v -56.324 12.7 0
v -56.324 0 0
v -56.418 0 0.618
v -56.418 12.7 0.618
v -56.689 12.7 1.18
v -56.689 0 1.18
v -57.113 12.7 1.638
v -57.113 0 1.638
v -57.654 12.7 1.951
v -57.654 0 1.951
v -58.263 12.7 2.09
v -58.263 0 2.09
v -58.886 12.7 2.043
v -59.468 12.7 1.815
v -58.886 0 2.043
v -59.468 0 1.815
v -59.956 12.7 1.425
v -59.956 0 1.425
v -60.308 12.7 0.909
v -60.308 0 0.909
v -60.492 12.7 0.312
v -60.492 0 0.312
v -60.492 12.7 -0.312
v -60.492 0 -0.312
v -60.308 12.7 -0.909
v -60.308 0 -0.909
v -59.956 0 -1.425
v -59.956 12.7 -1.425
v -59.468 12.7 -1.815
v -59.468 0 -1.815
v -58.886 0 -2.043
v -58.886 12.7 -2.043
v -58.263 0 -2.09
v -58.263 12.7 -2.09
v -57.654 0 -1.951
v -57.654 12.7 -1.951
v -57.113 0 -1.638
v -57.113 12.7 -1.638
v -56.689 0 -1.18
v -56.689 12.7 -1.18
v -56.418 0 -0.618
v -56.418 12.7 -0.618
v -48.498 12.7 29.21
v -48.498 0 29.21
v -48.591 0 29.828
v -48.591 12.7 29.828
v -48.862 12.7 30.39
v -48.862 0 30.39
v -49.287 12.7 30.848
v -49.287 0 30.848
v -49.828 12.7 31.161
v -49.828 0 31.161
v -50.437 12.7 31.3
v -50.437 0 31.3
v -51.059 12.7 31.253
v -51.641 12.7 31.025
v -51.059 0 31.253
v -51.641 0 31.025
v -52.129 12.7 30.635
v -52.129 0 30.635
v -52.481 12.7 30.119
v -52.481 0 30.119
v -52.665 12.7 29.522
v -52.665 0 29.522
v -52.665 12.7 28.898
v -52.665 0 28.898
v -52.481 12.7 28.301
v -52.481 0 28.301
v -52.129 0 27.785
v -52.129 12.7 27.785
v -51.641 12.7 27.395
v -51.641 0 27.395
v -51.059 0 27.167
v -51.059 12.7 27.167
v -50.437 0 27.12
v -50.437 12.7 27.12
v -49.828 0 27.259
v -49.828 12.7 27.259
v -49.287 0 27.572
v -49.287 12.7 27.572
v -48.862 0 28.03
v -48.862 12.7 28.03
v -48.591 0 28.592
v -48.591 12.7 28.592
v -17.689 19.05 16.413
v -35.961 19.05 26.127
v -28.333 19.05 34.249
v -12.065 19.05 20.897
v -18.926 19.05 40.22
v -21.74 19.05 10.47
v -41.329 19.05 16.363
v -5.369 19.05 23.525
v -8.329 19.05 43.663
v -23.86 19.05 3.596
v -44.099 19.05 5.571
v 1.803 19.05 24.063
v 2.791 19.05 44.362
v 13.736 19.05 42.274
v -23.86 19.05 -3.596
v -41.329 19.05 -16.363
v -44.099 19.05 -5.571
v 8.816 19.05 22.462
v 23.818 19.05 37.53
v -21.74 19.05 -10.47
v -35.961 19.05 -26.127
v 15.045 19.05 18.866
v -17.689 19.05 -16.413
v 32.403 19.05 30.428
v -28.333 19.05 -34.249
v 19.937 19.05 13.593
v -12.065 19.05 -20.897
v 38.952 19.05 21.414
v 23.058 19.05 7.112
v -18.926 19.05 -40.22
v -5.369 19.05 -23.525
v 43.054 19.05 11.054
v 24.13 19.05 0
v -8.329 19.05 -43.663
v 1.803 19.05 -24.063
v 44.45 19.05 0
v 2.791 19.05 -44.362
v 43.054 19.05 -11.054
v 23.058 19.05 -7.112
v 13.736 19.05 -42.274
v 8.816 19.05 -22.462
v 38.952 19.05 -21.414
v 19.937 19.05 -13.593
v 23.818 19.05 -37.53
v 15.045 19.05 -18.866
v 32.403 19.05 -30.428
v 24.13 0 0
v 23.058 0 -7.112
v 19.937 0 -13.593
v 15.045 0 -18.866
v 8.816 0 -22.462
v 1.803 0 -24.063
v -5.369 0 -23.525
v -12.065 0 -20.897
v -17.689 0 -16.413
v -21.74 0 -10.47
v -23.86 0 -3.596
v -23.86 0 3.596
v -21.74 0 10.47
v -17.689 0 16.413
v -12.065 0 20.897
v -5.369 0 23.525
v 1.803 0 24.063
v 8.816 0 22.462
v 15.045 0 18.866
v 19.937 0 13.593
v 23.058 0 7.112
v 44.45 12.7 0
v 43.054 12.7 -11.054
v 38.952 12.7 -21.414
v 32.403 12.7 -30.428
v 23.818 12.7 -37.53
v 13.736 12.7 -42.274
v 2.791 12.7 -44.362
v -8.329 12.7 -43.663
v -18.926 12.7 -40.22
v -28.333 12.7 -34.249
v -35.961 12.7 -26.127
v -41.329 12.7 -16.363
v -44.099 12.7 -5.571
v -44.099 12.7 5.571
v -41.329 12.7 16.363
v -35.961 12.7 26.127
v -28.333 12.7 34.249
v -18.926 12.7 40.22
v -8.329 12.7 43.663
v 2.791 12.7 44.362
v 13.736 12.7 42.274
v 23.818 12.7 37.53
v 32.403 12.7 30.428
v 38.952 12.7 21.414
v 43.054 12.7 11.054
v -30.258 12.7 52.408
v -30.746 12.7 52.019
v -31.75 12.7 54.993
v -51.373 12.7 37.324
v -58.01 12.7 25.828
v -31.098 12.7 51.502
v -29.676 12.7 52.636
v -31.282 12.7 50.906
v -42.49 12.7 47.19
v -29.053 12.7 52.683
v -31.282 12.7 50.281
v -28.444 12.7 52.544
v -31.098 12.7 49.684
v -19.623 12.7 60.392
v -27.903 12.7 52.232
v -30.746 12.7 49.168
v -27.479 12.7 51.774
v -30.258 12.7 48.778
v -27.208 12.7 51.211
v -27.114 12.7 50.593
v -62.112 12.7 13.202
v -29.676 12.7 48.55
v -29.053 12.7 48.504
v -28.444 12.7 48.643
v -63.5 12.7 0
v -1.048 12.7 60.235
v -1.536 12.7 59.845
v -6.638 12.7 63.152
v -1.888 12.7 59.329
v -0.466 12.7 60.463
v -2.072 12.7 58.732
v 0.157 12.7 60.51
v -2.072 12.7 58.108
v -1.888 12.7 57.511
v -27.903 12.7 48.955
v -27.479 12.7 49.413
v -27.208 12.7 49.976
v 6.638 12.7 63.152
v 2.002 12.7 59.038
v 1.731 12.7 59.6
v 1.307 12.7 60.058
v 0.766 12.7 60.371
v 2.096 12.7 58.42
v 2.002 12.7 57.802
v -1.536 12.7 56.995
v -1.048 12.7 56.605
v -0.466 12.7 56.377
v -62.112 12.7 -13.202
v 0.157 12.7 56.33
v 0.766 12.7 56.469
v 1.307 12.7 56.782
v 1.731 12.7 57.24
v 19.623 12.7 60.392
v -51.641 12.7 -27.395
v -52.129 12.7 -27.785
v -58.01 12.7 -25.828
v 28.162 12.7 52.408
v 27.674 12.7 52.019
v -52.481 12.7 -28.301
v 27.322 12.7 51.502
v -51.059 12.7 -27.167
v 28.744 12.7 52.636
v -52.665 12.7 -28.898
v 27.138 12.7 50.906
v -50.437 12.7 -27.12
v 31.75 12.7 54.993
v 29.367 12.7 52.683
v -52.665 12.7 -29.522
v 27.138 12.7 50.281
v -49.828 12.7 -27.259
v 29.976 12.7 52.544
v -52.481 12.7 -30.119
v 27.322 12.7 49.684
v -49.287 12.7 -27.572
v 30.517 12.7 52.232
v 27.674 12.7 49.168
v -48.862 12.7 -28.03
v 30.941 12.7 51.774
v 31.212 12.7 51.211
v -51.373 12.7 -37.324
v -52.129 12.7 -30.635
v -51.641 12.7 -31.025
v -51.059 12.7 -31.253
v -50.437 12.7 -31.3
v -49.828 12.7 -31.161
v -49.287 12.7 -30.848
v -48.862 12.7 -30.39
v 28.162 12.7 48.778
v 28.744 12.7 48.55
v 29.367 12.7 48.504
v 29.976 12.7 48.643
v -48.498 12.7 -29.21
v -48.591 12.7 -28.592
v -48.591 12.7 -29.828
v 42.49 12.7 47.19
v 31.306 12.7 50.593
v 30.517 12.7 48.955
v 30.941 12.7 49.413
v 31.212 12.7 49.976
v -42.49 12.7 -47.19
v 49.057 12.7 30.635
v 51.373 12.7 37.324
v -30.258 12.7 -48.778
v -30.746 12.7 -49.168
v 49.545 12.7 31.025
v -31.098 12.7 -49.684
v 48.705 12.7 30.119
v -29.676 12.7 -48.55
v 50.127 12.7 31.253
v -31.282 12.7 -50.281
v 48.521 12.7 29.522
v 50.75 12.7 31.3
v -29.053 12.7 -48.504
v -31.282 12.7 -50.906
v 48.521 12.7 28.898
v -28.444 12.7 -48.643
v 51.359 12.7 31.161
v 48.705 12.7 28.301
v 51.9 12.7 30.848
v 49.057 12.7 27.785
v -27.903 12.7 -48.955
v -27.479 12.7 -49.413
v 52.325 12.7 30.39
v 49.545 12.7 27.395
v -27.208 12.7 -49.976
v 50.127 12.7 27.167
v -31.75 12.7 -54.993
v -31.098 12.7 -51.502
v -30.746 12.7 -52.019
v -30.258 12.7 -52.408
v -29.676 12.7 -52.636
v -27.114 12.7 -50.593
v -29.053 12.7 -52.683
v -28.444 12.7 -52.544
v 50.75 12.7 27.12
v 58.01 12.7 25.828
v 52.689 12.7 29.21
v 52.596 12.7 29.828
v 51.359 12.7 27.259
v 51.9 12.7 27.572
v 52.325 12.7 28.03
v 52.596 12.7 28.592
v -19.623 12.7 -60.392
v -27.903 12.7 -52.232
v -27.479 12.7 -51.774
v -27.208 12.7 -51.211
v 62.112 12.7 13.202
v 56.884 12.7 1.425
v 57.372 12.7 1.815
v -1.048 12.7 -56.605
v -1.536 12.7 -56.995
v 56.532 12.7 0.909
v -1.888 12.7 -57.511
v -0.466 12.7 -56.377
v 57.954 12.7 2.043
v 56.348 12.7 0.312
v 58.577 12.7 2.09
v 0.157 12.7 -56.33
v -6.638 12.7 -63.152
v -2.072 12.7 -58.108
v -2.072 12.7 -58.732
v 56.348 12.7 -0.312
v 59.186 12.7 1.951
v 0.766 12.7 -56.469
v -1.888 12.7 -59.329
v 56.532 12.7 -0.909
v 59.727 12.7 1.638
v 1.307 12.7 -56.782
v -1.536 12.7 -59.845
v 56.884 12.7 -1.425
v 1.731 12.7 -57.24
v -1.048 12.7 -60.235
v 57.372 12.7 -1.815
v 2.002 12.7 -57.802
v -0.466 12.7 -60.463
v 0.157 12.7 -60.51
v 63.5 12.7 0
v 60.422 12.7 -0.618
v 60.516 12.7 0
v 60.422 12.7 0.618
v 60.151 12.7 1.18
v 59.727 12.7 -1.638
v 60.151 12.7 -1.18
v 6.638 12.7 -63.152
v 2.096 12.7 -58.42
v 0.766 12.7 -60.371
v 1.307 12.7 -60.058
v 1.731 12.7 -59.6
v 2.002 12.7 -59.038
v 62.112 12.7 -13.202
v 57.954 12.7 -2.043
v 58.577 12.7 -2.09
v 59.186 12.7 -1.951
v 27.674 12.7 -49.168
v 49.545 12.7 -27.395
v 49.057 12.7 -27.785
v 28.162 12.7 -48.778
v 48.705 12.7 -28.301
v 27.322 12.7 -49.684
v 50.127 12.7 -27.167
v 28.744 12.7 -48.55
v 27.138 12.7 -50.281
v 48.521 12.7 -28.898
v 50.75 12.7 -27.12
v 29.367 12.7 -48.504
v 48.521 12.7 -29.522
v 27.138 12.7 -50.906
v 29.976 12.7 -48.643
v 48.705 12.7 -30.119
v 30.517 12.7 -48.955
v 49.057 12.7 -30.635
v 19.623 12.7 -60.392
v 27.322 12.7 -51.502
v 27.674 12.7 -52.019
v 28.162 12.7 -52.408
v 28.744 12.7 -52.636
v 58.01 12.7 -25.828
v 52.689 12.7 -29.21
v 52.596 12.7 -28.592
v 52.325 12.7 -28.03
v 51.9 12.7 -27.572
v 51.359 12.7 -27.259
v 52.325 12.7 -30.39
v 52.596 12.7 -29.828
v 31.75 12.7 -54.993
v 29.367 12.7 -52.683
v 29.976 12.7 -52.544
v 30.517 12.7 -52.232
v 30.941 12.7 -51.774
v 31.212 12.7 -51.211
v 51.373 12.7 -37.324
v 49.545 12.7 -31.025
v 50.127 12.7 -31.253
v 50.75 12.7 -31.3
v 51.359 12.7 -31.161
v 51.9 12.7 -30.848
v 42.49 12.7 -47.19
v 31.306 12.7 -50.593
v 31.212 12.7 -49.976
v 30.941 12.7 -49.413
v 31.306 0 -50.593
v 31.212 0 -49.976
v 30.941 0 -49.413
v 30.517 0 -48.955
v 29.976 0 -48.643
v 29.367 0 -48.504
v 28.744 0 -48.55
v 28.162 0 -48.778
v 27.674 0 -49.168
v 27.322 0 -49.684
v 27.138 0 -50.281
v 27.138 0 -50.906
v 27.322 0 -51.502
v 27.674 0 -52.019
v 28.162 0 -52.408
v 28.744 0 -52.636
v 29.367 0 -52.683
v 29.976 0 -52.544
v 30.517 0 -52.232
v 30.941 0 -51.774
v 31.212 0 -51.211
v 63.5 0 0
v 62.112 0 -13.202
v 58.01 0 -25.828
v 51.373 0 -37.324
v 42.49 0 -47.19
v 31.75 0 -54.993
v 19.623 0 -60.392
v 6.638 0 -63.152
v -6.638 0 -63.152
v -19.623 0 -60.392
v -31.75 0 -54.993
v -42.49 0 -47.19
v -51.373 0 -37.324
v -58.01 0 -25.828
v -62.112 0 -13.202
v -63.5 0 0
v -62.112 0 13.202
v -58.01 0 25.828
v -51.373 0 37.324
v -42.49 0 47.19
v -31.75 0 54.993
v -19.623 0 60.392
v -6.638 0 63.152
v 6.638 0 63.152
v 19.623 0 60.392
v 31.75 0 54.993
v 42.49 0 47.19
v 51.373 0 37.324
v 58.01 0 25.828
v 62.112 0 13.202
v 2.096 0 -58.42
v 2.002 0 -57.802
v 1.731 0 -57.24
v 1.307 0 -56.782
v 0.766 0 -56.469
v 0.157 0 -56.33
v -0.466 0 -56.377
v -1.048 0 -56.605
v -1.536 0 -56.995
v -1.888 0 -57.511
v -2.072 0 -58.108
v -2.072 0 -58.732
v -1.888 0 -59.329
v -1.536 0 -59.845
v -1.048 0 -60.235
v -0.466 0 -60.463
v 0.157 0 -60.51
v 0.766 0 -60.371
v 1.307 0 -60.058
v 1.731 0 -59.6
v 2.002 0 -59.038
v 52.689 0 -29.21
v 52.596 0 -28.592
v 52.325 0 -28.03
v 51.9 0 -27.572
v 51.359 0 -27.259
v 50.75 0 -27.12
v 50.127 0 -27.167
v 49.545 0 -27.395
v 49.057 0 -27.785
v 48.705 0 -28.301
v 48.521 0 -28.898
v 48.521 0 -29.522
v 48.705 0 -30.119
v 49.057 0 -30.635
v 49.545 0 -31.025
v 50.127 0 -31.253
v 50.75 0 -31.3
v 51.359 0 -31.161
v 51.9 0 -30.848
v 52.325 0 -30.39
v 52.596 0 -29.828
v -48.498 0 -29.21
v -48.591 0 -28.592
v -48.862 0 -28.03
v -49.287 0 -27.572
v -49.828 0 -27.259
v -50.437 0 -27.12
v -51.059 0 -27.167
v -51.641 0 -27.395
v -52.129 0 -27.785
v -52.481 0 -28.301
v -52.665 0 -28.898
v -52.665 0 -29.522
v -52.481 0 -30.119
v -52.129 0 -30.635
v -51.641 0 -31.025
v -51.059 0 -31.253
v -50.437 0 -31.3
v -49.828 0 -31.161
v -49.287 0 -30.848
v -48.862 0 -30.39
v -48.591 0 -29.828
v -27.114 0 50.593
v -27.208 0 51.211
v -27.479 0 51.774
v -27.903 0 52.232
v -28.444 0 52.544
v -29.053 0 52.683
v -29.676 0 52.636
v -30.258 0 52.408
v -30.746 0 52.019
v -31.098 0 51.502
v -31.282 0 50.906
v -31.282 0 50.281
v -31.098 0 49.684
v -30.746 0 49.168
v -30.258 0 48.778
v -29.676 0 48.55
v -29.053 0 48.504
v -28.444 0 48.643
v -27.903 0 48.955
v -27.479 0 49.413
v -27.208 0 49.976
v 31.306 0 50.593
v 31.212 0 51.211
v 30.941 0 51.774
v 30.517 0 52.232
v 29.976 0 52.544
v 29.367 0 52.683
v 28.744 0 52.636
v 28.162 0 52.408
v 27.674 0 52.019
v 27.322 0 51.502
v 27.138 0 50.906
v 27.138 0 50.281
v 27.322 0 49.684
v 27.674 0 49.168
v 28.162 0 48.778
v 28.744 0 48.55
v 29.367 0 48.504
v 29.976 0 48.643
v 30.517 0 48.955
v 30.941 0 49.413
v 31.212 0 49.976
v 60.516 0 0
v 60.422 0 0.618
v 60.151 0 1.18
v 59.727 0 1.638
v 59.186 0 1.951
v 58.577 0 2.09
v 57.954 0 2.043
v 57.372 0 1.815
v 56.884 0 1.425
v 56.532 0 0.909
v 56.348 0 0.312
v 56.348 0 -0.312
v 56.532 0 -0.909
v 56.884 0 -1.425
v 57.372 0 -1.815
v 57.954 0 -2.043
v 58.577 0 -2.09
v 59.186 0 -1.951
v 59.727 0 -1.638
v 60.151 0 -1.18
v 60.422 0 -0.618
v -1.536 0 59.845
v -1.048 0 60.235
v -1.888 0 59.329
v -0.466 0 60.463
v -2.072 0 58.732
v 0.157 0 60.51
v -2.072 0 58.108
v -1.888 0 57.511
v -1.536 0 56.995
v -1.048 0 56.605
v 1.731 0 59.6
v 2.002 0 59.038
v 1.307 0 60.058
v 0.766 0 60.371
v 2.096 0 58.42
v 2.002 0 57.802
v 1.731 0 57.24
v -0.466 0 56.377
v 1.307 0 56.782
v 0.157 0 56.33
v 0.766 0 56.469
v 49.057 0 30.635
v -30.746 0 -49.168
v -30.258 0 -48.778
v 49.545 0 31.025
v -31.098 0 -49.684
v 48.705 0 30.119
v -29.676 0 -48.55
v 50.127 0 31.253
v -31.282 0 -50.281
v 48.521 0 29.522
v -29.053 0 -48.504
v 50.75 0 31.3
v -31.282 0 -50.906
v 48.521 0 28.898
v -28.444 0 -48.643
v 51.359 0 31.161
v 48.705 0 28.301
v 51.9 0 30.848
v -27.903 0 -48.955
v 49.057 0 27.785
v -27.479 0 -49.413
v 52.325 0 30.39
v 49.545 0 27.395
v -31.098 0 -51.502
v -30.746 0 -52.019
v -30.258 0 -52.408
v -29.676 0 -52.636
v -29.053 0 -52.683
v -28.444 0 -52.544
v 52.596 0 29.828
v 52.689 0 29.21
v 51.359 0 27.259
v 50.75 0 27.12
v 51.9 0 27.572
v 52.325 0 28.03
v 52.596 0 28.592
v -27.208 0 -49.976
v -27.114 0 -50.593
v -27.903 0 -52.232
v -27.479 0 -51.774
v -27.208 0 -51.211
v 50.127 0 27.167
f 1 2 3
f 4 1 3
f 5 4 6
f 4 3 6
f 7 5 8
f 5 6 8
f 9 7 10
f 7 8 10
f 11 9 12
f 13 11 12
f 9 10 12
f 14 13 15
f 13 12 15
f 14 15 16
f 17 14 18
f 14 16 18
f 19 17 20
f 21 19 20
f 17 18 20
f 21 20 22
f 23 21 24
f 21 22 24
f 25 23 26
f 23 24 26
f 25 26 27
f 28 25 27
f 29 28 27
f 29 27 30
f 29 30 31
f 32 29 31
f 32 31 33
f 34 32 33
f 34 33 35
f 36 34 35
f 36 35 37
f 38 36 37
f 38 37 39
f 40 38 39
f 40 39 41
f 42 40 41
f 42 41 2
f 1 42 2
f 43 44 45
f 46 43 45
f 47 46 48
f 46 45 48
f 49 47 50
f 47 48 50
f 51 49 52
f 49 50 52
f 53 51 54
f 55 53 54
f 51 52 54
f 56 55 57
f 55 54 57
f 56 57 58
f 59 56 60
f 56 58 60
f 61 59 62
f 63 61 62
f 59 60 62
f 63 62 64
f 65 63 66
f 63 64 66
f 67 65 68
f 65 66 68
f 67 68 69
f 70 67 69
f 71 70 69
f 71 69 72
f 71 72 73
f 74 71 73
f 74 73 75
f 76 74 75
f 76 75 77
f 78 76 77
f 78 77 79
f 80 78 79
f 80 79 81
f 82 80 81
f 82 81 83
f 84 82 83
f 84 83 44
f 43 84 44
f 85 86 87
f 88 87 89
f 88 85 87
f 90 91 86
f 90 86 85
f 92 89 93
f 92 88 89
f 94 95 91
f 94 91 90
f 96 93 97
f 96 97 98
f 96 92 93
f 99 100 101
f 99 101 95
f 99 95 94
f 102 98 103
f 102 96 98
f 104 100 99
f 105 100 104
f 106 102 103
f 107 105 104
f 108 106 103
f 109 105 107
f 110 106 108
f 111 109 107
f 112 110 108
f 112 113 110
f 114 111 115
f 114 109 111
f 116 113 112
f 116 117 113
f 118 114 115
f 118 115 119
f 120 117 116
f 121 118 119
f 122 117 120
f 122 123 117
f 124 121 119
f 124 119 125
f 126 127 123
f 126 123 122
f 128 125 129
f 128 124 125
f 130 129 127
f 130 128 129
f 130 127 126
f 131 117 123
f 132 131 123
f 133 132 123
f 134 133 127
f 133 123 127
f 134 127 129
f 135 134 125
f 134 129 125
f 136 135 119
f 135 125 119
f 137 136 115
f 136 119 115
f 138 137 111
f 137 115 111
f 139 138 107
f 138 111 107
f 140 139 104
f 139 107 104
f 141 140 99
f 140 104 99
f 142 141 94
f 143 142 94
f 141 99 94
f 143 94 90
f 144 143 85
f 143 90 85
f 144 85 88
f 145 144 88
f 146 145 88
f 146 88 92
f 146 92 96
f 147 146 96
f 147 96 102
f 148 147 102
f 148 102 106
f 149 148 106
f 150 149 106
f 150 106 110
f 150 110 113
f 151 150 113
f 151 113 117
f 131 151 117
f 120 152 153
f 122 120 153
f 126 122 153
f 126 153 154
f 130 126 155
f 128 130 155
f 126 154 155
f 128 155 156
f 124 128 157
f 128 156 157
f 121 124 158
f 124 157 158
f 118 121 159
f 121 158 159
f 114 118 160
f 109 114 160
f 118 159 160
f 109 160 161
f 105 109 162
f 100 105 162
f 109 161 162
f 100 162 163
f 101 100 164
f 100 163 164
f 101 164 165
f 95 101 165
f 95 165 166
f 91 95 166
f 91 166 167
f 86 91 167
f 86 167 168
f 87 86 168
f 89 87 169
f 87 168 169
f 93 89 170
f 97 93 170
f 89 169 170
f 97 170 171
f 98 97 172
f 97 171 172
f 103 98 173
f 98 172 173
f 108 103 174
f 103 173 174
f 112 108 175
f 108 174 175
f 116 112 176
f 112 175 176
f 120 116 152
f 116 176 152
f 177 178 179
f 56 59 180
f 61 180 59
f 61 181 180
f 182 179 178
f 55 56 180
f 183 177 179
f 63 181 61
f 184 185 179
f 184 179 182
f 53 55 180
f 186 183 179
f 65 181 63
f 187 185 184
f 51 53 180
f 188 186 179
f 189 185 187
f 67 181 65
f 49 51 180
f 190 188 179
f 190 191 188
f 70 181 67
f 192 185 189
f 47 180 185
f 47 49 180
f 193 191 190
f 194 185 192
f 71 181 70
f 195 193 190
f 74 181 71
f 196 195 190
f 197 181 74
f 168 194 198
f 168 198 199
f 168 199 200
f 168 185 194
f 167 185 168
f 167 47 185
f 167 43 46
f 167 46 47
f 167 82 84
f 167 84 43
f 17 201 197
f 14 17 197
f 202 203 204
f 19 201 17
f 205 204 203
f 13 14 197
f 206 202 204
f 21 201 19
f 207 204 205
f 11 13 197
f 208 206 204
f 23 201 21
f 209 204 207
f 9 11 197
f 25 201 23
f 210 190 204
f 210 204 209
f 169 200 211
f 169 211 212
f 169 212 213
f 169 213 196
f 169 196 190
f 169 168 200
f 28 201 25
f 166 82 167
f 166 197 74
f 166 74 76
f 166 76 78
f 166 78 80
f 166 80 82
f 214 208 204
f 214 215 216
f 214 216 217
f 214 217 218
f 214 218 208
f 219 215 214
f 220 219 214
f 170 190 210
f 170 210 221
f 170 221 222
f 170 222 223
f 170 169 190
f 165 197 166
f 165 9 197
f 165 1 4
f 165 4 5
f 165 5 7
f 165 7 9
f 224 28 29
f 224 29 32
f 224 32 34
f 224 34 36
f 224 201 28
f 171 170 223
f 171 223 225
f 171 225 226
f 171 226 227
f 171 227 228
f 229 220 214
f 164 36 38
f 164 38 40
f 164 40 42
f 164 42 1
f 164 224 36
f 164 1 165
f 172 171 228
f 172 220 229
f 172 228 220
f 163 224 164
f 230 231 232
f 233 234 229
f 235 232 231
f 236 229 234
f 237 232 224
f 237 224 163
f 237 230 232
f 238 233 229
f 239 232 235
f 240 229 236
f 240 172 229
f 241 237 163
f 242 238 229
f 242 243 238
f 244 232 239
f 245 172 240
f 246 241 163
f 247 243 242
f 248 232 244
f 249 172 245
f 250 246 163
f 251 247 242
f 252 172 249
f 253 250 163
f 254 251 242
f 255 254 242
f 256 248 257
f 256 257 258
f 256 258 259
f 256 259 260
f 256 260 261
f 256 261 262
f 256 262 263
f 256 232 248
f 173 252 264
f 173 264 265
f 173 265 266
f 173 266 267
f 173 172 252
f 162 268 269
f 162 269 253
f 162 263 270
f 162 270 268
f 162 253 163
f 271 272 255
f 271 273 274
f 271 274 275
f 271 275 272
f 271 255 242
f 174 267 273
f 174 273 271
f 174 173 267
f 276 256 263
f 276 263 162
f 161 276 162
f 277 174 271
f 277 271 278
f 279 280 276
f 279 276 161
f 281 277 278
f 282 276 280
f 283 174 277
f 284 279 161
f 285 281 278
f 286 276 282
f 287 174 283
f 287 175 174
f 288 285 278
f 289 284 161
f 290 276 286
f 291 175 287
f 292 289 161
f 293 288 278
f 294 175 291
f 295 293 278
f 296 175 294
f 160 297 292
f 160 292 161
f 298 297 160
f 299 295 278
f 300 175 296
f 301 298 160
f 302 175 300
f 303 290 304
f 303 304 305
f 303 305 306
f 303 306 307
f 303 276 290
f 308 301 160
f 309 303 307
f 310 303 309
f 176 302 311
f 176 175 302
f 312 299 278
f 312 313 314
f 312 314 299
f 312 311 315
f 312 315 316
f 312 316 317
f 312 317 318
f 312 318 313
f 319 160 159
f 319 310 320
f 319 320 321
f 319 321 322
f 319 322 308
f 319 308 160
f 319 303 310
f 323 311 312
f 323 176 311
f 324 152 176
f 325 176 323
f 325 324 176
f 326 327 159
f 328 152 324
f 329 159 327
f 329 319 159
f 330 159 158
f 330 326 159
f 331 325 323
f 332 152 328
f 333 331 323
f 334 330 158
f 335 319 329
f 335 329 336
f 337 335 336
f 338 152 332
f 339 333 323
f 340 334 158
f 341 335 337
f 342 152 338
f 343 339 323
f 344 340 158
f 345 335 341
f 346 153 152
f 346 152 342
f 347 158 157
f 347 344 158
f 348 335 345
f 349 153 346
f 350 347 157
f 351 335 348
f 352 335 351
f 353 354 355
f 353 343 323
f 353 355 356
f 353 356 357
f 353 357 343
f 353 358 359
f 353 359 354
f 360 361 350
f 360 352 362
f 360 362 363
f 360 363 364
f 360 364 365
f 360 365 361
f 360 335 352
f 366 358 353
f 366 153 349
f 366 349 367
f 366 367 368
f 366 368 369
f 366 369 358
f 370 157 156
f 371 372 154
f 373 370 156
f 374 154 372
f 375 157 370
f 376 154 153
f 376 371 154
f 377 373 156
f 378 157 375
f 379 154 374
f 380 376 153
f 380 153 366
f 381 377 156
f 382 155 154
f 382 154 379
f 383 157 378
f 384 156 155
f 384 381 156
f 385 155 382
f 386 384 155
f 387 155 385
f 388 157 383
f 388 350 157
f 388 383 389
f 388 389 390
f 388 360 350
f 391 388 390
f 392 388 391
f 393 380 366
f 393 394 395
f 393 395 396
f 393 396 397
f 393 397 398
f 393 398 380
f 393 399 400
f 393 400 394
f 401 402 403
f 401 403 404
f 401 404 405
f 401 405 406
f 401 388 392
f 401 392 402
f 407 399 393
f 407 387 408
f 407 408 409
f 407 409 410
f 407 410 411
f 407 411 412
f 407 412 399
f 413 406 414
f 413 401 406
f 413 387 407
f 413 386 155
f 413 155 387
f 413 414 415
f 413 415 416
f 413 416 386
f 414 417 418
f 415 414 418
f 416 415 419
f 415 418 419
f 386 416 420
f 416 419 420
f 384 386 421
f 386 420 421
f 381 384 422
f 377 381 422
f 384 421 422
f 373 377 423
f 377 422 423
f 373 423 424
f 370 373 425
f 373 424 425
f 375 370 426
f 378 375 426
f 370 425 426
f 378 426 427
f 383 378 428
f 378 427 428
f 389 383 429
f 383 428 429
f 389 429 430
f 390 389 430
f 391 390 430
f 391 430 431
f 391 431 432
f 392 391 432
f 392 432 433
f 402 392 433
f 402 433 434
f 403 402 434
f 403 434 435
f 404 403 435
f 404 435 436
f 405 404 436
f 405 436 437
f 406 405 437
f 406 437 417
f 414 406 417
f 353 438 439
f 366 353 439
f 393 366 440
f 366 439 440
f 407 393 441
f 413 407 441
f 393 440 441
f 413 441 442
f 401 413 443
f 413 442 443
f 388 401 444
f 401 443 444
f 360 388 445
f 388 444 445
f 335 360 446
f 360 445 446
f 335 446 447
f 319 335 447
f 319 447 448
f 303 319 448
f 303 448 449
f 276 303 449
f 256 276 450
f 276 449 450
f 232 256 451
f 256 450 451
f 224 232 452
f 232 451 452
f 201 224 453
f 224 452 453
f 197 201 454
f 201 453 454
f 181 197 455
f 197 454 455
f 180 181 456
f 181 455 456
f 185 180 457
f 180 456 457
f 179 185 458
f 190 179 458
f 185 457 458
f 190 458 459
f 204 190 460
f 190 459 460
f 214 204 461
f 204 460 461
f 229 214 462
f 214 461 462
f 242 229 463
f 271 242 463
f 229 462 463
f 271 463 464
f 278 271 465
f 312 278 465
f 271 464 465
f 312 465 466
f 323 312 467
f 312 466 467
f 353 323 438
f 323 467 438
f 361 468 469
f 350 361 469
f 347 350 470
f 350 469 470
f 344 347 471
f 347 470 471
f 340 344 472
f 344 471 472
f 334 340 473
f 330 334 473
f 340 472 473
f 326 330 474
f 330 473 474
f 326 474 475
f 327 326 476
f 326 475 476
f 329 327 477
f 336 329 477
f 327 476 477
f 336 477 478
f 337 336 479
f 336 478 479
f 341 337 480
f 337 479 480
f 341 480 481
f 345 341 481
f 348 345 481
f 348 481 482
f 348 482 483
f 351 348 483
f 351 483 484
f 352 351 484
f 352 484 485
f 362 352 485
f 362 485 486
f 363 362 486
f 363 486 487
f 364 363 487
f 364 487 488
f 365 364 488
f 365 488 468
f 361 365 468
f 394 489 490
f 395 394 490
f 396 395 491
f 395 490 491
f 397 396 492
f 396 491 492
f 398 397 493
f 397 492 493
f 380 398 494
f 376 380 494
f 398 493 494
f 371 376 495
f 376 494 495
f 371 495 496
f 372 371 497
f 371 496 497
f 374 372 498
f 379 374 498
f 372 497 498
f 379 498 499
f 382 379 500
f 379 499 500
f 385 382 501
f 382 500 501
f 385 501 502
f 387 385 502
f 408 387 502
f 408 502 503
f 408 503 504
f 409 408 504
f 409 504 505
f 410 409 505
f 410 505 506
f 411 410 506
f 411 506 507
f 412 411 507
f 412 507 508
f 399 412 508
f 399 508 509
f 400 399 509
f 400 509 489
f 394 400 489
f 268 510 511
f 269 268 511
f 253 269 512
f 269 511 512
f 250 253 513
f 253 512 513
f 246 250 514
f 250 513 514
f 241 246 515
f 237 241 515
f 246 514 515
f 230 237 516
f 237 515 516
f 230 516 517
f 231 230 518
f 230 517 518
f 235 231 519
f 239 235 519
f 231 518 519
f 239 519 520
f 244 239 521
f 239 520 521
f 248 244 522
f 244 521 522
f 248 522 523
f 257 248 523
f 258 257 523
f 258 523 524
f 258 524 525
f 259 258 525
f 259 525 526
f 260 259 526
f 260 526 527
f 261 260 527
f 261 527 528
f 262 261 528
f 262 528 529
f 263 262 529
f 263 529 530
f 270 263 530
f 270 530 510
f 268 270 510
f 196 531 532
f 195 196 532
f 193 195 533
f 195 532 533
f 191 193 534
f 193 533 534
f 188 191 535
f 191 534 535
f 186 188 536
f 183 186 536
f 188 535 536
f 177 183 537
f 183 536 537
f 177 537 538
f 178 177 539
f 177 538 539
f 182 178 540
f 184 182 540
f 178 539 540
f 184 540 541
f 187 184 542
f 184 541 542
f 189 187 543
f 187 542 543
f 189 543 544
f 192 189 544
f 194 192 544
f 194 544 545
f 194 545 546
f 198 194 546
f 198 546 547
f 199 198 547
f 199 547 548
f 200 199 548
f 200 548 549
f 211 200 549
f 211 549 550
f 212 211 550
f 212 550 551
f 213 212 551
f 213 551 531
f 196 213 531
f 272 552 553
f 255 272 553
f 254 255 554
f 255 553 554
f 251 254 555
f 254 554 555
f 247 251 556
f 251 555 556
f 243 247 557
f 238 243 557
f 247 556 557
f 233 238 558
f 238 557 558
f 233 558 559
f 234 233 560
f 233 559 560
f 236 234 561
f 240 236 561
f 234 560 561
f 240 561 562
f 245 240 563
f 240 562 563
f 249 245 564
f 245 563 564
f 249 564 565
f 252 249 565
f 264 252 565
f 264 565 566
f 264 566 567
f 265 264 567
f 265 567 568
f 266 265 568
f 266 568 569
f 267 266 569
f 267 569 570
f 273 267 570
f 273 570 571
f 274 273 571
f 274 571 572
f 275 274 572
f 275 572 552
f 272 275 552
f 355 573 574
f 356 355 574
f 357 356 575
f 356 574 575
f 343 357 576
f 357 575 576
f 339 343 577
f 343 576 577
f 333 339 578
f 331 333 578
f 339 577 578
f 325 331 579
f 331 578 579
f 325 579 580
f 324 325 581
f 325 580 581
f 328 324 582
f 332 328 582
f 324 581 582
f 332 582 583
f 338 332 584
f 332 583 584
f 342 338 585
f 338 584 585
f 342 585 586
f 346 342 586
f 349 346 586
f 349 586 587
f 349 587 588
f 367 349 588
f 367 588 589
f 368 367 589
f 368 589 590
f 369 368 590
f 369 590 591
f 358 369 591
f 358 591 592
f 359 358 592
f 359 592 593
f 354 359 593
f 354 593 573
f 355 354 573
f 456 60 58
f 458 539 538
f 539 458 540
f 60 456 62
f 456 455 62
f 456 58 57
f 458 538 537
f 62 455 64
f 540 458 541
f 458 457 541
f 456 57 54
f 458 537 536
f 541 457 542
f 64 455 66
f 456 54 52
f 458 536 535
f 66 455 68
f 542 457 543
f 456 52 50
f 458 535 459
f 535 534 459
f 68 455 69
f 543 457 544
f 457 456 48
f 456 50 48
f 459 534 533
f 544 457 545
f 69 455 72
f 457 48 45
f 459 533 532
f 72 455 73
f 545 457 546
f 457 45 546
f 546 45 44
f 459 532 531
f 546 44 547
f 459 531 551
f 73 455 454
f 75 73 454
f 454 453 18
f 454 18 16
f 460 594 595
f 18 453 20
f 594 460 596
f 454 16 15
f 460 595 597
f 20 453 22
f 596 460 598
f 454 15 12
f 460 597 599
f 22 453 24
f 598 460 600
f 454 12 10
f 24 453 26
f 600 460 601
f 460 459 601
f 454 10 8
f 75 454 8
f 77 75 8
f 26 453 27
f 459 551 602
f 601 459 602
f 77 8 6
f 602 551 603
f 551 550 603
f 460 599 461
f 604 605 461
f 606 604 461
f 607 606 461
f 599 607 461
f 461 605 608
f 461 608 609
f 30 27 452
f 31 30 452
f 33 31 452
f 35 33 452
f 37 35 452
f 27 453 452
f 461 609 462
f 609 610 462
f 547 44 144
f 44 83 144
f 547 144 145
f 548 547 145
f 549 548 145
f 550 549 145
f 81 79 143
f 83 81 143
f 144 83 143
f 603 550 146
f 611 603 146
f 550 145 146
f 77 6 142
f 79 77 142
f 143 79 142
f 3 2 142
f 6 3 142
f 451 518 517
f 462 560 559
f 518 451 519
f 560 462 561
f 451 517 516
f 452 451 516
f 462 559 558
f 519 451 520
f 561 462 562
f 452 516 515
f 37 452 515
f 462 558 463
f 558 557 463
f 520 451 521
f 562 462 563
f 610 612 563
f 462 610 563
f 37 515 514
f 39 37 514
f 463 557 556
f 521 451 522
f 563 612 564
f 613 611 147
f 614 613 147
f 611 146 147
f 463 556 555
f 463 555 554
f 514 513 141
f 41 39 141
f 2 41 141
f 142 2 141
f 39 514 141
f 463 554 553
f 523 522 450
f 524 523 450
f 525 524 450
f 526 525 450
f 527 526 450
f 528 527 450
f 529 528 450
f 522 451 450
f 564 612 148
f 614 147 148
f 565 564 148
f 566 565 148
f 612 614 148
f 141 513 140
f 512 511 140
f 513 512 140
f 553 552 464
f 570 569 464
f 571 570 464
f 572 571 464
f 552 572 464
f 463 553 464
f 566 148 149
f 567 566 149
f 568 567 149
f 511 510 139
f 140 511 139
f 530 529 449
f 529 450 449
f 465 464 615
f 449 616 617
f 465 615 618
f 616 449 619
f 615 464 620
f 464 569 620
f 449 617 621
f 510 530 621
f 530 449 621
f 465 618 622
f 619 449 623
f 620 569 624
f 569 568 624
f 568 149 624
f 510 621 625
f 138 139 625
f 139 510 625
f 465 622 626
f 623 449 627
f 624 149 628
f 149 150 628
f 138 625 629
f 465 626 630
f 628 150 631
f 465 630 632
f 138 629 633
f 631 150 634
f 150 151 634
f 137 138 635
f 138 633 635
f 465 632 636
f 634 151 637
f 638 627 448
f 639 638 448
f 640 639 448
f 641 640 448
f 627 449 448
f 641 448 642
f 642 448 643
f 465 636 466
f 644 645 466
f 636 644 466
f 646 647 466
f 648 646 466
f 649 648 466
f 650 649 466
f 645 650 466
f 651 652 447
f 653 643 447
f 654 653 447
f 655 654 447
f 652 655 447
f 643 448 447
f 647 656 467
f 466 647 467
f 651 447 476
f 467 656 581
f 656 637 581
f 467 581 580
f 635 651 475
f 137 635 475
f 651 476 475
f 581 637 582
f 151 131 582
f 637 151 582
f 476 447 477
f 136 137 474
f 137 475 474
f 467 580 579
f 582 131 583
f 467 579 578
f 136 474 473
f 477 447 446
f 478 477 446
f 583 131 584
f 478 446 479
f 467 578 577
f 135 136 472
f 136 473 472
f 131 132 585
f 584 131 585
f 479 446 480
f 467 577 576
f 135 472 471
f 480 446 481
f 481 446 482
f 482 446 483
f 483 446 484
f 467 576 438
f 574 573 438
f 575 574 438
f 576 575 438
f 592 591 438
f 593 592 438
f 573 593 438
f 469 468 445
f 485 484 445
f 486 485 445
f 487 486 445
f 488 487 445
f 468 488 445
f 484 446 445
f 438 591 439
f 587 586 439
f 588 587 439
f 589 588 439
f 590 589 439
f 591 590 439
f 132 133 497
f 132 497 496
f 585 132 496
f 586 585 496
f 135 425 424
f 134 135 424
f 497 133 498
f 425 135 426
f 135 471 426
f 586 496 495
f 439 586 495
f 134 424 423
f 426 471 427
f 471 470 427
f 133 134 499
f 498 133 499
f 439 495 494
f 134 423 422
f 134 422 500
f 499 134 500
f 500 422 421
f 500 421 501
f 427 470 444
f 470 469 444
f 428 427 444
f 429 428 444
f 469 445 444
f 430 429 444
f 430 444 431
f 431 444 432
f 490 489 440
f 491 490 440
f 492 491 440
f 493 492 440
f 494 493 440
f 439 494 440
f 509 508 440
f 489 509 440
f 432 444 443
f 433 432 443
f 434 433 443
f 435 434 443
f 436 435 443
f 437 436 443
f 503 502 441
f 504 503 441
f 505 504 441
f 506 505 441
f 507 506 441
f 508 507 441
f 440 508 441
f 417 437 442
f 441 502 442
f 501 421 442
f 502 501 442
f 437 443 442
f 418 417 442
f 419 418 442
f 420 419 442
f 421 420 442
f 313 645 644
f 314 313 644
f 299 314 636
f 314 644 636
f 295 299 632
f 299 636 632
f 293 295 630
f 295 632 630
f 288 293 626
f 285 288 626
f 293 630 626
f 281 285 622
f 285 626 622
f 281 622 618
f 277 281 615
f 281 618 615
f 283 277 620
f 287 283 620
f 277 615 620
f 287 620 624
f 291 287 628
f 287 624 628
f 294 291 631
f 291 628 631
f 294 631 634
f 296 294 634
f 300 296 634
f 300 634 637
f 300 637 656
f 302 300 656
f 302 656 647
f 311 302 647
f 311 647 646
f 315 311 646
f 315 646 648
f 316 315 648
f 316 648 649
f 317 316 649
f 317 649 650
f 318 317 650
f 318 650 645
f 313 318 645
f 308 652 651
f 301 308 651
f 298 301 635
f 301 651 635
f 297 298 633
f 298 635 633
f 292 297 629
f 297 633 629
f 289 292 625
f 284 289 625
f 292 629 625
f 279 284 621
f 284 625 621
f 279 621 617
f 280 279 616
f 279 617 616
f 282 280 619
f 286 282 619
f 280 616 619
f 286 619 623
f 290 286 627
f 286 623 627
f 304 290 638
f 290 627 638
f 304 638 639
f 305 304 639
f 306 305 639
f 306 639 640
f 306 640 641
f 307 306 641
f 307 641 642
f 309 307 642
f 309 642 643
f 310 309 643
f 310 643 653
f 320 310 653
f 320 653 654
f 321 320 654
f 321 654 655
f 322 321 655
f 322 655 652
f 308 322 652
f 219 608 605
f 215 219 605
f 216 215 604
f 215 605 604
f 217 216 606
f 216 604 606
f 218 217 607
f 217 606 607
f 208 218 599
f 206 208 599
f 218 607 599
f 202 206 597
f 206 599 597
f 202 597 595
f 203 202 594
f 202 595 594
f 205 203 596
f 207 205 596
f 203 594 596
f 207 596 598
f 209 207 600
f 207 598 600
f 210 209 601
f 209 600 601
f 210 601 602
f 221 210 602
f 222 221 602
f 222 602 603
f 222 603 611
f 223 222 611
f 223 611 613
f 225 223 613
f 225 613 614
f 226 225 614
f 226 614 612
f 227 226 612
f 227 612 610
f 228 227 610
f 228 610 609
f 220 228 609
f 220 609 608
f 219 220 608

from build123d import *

# Parameters (mm, degrees)
SKETCH1_R               = 63.5
BOSS_EXTRUDE1_DEPTH     = 12.7
SKETCH2_R               = 44.45
BOSS_EXTRUDE2_DEPTH     = 6.35
SKETCH3_R               = 24.13
CUT_EXTRUDE1_DEPTH      = 1
CUT_EXTRUDE1_DEPTH_BACK = 20.05
SKETCH4_R               = 2.0955
CUT_EXTRUDE2_DEPTH      = 20.05


with BuildPart() as part:
    # Sketch1 → Boss-Extrude1 (new body)
    with BuildSketch(Plane(origin=(0, 0, 0), x_dir=(1, 0, 0), z_dir=(0, 1, 0))):
        Circle(SKETCH1_R)
    extrude(amount=BOSS_EXTRUDE1_DEPTH)

    # Sketch2 → Boss-Extrude2 (add)
    with BuildSketch(Plane(origin=(0, 12.7, 0), x_dir=(1, 0, 0), z_dir=(0, 1, 0))):
        Circle(SKETCH2_R)
    extrude(amount=BOSS_EXTRUDE2_DEPTH)

    # Sketch3 → Cut-Extrude1 (cut, two sides)
    with BuildSketch(Plane(origin=(0, 19.05, 0), x_dir=(1, 0, 0), z_dir=(0, 1, 0))) as cut_extrude1_sk:
        Circle(SKETCH3_R)
    extrude(amount=CUT_EXTRUDE1_DEPTH, mode=Mode.SUBTRACT)
    extrude(cut_extrude1_sk.sketch, amount=-CUT_EXTRUDE1_DEPTH_BACK, mode=Mode.SUBTRACT)

    # Sketch4 → Cut-Extrude2 (cut, through all)
    with BuildSketch(Plane.XZ):
        with Locations((0, -58.42)):
            Circle(SKETCH4_R)
        with Locations((-29.21, -50.593204089)):
            Circle(SKETCH4_R)
        with Locations((-50.593204089, -29.21)):
            Circle(SKETCH4_R)
        with Locations((-58.42, 0)):
            Circle(SKETCH4_R)
        with Locations((-50.593204089, 29.21)):
            Circle(SKETCH4_R)
        with Locations((-29.21, 50.593204089)):
            Circle(SKETCH4_R)
        with Locations((0, 58.42)):
            Circle(SKETCH4_R)
        with Locations((29.21, 50.593204089)):
            Circle(SKETCH4_R)
        with Locations((50.593204089, 29.21)):
            Circle(SKETCH4_R)
        with Locations((58.42, 0)):
            Circle(SKETCH4_R)
        with Locations((50.593204089, -29.21)):
            Circle(SKETCH4_R)
        with Locations((29.21, -50.593204089)):
            Circle(SKETCH4_R)
    extrude(amount=-CUT_EXTRUDE2_DEPTH, mode=Mode.SUBTRACT)


solid = part.part
